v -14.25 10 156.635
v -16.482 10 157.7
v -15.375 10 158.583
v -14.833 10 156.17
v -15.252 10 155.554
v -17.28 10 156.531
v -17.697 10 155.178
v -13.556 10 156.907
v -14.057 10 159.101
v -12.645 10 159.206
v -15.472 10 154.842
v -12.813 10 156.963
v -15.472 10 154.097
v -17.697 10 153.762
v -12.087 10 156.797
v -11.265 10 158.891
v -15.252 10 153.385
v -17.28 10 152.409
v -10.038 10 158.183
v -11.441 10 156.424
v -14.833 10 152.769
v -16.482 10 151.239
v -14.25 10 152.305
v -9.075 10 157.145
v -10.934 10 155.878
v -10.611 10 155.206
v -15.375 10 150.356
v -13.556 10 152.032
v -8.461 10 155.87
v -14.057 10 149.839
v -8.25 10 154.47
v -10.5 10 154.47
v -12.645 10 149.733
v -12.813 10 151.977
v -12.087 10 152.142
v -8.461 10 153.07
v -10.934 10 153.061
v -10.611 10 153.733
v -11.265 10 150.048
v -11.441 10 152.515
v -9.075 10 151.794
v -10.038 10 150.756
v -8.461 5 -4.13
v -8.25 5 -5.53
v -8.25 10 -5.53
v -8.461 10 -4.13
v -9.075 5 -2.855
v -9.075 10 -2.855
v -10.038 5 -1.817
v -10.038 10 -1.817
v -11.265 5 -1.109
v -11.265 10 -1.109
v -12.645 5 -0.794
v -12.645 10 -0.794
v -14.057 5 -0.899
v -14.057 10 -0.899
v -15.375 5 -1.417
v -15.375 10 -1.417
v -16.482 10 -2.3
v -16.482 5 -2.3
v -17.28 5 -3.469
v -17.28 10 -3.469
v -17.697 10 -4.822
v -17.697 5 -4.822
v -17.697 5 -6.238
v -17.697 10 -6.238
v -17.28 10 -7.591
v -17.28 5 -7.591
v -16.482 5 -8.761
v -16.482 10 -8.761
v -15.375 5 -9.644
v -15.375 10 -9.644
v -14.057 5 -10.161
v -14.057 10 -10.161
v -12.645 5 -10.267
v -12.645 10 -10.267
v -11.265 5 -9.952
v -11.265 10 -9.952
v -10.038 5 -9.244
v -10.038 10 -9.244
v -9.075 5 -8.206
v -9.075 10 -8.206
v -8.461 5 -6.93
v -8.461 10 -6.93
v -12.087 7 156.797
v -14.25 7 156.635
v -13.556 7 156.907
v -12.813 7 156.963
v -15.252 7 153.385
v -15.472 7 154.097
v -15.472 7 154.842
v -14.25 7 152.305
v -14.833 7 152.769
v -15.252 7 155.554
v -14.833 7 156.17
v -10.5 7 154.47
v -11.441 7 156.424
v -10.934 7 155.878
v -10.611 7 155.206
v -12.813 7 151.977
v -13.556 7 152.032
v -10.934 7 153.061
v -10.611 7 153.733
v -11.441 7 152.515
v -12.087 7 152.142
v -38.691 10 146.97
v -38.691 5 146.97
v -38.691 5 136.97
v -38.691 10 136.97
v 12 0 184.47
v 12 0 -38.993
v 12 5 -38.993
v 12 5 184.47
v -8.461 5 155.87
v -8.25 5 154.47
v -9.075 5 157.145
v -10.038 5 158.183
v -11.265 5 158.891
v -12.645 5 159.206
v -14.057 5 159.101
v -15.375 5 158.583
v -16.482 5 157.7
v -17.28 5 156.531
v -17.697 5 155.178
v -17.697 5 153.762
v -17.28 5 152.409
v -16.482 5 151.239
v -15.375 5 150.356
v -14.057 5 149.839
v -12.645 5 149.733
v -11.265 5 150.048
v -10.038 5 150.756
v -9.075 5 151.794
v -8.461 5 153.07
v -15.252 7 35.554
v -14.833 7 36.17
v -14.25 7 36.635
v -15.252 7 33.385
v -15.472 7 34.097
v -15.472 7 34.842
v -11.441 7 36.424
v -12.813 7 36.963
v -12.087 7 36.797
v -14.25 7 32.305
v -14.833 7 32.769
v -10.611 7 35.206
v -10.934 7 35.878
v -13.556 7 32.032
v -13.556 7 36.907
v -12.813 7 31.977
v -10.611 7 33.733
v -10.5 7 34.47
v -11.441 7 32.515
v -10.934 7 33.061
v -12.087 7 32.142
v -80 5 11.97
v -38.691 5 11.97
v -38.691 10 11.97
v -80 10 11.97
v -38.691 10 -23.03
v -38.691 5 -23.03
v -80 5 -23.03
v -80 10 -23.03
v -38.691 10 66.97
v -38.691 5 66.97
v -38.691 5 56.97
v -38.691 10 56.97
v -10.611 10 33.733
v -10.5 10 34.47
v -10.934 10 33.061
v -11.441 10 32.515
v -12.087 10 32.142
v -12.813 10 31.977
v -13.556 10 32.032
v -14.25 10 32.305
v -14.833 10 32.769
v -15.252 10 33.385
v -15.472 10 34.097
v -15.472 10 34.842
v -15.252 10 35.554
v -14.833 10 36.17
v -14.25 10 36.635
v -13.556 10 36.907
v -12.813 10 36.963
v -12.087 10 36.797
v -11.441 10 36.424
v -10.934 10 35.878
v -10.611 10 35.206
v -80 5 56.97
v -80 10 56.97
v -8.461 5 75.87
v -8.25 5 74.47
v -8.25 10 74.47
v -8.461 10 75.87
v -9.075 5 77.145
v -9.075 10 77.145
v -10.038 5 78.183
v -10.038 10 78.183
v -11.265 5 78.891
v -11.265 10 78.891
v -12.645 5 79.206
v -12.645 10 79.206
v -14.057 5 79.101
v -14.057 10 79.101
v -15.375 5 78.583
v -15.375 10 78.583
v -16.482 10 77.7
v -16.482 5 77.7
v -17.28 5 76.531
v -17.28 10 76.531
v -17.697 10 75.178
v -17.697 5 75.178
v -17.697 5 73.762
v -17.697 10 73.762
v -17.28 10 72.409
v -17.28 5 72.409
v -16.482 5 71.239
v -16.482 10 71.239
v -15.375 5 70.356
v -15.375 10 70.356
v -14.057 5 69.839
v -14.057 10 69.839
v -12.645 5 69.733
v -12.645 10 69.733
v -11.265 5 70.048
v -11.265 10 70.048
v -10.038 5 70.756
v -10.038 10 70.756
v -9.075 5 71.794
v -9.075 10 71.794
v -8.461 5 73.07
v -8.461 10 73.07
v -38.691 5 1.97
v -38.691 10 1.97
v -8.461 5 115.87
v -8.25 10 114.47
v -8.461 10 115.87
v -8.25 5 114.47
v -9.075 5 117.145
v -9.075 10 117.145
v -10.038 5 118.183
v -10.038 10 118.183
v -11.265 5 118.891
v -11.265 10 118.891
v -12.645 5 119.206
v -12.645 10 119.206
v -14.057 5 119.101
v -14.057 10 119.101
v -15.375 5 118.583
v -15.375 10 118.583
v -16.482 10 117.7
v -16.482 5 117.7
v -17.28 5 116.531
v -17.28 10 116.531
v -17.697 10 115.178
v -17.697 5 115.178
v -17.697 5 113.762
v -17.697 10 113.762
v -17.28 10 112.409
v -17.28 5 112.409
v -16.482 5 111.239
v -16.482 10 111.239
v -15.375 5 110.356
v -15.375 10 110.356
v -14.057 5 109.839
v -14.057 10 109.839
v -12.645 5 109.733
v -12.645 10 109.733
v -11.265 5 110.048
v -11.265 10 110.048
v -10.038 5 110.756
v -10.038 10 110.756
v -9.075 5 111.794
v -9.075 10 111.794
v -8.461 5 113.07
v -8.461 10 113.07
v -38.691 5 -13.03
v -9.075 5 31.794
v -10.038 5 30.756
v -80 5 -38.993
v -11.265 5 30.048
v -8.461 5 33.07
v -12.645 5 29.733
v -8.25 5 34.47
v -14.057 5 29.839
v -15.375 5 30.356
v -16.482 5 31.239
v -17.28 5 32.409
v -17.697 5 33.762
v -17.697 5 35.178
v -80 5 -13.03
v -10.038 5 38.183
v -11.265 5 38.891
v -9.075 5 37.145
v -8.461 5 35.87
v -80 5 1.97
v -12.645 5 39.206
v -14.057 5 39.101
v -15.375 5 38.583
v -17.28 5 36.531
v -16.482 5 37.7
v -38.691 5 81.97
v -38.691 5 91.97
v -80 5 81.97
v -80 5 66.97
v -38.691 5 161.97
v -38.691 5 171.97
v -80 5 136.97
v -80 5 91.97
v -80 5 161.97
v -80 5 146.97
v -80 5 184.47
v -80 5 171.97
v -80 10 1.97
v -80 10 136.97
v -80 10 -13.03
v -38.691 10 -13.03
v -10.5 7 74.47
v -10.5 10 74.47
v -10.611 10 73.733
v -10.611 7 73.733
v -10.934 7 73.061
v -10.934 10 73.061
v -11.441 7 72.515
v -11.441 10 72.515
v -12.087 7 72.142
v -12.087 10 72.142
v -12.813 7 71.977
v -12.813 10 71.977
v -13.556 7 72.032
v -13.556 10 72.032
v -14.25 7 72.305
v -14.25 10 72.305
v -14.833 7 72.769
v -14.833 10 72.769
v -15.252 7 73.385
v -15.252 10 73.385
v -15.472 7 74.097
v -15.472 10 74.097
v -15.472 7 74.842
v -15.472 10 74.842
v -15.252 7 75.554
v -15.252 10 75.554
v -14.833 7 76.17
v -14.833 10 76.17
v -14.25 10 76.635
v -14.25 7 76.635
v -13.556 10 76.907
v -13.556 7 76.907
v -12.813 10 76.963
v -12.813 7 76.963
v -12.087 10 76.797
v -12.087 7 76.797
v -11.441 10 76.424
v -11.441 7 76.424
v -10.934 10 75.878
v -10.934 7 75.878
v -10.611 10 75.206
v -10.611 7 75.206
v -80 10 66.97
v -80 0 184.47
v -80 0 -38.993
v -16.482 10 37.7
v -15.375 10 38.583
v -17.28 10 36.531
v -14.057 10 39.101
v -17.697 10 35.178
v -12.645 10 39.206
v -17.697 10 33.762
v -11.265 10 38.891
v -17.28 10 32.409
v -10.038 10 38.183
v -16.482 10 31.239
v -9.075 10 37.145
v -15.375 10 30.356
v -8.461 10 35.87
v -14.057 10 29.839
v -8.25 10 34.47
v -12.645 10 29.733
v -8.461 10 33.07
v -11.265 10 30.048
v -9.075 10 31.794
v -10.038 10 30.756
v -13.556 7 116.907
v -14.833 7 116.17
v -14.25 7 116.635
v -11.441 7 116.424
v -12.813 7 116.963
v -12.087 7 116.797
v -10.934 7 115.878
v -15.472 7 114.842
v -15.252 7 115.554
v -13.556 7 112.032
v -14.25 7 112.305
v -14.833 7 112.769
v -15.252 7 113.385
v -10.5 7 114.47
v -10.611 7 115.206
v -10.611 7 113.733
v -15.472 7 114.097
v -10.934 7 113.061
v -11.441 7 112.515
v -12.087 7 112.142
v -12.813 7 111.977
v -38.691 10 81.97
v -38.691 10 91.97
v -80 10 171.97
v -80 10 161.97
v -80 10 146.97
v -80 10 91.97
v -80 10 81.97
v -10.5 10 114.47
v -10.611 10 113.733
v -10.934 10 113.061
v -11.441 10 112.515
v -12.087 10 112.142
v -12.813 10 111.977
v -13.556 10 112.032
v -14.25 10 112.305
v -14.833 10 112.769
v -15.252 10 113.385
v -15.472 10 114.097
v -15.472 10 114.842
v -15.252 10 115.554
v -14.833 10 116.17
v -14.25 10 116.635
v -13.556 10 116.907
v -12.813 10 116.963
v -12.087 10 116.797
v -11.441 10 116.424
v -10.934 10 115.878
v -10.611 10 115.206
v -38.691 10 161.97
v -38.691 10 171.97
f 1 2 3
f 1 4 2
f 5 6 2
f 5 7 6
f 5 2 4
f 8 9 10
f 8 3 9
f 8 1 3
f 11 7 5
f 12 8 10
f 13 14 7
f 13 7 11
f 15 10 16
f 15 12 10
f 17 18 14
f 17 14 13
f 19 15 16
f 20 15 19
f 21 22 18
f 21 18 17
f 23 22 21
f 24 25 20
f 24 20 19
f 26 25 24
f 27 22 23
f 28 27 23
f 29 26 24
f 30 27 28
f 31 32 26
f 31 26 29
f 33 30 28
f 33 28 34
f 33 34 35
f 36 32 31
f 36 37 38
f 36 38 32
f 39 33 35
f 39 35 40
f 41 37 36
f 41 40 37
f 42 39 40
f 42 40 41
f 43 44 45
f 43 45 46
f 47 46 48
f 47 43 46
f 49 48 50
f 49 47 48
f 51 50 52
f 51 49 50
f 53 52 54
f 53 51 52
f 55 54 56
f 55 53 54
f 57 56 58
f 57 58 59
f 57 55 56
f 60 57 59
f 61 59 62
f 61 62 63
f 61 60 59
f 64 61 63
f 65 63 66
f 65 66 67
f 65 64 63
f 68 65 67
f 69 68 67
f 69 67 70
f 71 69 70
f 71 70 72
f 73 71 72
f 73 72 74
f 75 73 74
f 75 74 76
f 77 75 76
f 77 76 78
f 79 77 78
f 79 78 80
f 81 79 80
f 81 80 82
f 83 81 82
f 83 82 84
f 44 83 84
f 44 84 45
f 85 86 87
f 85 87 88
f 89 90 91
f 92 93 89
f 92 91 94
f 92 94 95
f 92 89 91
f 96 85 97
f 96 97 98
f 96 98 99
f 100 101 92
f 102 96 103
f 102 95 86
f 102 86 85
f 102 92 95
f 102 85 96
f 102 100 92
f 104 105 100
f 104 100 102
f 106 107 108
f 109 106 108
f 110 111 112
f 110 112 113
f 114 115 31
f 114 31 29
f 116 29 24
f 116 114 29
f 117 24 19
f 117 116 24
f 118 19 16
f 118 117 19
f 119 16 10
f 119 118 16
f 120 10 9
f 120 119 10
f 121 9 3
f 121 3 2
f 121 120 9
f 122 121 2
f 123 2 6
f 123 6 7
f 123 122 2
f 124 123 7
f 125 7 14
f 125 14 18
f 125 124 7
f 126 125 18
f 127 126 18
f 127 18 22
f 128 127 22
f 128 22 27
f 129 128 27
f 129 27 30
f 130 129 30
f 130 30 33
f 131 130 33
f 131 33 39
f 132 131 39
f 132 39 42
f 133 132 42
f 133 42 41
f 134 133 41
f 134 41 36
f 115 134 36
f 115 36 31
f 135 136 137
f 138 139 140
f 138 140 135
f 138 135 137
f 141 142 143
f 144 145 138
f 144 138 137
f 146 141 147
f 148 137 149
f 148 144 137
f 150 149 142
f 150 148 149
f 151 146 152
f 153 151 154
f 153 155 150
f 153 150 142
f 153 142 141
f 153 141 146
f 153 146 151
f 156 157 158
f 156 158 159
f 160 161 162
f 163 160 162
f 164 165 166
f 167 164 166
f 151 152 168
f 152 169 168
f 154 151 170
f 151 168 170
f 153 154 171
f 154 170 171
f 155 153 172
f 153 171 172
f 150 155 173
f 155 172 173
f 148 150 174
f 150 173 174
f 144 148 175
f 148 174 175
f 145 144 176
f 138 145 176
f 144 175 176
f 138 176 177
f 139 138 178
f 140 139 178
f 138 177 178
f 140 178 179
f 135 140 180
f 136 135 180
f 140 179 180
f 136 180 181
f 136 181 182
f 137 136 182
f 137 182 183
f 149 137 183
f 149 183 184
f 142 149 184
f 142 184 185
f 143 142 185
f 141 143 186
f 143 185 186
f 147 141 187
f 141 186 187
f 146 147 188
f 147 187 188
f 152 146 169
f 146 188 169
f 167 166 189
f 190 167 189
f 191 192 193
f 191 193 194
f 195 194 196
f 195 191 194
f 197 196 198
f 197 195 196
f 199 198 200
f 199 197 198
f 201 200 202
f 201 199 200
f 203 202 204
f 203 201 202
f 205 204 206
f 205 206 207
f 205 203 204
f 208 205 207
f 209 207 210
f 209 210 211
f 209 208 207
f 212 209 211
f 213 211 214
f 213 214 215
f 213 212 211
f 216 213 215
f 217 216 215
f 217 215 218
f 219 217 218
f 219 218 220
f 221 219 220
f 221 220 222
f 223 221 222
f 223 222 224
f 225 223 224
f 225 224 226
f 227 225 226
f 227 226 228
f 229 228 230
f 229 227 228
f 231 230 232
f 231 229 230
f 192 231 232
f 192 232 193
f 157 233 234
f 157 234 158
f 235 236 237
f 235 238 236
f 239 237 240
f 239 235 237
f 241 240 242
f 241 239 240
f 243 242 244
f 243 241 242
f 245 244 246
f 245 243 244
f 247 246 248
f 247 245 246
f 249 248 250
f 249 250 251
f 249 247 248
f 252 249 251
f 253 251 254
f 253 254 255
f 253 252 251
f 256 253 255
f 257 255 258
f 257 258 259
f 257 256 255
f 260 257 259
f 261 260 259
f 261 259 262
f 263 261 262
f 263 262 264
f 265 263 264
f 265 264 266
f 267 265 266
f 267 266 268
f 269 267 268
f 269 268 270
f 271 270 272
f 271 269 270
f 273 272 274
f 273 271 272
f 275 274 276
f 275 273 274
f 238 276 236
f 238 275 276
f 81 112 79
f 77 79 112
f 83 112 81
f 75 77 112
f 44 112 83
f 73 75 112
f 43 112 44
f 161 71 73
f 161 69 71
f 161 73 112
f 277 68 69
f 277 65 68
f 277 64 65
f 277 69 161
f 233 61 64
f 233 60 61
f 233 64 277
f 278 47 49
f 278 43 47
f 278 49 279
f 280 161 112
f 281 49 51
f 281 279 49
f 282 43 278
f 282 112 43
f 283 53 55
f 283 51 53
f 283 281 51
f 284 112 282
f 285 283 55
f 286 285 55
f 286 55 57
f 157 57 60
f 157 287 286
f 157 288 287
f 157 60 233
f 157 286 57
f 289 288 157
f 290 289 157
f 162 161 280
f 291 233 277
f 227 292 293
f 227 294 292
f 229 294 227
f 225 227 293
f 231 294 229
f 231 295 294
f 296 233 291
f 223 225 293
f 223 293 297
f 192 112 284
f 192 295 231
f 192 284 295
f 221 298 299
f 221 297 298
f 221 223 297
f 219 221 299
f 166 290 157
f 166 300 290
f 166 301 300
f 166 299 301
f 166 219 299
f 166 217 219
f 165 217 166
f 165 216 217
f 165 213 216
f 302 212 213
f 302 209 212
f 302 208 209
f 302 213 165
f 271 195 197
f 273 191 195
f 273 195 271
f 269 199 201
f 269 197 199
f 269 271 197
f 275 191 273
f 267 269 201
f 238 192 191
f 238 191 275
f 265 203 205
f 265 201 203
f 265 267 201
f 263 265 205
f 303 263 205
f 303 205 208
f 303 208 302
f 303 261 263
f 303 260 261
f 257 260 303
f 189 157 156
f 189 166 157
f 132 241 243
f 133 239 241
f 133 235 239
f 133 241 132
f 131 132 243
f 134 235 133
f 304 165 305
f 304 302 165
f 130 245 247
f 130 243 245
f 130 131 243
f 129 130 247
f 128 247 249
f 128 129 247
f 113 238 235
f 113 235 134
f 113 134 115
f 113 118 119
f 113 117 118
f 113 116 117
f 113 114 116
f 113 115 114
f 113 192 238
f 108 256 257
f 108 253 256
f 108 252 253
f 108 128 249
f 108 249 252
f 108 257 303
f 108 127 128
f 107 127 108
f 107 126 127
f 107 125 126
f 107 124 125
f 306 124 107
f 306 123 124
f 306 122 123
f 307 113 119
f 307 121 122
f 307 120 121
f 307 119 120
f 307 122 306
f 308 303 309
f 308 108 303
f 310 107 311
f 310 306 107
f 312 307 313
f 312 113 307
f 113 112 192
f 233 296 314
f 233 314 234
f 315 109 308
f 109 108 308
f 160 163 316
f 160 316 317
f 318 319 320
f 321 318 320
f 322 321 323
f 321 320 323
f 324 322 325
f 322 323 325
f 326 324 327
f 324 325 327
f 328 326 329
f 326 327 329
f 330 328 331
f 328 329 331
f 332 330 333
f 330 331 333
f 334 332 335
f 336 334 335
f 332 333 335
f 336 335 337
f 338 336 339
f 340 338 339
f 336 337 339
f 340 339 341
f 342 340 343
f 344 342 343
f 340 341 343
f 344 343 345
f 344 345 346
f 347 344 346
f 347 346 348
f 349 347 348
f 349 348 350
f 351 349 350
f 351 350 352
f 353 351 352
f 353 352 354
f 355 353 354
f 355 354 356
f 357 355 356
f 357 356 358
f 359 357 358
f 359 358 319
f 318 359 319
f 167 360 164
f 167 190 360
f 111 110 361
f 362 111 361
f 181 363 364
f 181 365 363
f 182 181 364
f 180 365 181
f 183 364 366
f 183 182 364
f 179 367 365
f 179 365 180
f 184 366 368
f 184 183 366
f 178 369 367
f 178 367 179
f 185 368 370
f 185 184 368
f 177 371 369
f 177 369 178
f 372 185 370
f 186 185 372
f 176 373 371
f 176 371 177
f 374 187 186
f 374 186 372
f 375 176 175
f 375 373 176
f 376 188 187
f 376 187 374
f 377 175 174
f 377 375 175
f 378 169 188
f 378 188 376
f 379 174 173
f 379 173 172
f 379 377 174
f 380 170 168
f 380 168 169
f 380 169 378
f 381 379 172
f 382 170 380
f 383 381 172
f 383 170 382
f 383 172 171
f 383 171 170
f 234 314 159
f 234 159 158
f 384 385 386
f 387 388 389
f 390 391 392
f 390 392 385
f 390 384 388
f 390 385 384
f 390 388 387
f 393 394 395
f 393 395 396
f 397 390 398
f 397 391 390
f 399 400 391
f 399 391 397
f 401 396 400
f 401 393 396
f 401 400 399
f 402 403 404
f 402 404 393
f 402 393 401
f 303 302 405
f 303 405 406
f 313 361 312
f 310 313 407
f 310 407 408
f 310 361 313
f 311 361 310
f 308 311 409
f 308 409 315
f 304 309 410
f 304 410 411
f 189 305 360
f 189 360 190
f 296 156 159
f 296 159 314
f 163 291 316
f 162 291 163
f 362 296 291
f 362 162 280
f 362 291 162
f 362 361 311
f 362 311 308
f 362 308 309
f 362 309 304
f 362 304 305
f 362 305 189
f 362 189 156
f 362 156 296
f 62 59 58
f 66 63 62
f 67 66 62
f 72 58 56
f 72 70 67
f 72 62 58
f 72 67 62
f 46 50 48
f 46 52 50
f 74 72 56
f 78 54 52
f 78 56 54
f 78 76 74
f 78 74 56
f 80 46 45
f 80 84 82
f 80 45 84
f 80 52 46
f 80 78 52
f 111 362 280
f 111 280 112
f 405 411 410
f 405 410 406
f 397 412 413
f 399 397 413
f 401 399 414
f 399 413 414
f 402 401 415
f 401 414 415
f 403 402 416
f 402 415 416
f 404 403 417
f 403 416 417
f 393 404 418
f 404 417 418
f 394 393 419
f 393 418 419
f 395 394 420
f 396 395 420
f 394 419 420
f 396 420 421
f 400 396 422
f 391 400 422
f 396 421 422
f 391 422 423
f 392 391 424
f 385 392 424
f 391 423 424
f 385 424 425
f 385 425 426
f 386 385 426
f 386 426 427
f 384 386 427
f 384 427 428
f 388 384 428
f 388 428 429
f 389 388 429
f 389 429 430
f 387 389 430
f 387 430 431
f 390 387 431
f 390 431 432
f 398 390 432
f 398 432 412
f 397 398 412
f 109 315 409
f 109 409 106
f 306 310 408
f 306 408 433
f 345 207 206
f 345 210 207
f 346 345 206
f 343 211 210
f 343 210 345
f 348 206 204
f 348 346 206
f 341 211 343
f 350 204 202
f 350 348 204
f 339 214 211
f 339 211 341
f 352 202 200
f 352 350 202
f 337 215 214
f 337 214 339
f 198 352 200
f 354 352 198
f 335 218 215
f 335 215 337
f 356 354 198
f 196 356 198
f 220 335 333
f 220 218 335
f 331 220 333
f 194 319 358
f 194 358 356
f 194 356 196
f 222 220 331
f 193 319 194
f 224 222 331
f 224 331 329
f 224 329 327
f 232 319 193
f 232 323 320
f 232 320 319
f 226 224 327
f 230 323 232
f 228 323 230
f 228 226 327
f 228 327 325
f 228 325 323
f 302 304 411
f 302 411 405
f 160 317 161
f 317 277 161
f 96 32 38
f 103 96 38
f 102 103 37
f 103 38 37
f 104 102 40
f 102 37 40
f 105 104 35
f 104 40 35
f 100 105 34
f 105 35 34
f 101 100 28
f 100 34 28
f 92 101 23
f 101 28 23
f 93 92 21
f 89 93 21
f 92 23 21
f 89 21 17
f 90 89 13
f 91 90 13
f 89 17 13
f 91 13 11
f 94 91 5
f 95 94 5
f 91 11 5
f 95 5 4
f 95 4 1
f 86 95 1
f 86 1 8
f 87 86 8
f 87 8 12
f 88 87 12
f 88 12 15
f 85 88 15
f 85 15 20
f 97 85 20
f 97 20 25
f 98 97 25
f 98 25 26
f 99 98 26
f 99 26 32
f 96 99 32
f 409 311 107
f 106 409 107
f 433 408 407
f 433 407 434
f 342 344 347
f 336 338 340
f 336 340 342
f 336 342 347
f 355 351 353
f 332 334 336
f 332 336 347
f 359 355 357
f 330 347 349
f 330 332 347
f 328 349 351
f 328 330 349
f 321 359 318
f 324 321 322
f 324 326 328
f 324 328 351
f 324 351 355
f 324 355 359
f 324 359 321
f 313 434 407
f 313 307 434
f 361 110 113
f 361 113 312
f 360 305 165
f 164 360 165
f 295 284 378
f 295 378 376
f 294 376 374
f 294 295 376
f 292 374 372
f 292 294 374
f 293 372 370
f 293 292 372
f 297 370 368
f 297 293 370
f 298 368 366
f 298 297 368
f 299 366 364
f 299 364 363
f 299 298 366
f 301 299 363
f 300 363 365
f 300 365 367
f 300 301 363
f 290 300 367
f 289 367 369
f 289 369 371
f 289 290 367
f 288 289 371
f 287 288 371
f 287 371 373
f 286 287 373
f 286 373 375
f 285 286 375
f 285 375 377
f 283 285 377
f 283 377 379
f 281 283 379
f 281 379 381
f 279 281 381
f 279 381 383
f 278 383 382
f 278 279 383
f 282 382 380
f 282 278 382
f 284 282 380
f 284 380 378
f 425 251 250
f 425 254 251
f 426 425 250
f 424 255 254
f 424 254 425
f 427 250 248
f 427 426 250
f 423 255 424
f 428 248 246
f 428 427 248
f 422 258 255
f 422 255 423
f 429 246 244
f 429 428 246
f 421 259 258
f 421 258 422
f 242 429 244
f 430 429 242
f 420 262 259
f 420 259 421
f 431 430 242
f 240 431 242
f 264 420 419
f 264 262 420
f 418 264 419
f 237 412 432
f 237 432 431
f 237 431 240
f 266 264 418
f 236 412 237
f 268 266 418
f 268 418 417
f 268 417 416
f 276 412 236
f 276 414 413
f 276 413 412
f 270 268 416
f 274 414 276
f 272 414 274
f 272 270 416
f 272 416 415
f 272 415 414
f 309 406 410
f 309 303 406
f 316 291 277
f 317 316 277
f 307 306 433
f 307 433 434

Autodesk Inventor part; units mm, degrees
ref_plane "YZ Plane" through (0, 0, 0) normal (1, 0, 0) x (0, 1, 0)
ref_plane "XZ Plane" through (0, 0, 0) normal (0, 1, 0) x (-1, 0, 0)
ref_plane "XY Plane" through (0, 0, 0) normal (0, 0, 1) x (1, 0, 0)
sketch "Sketch1" plane through (0, 0, 0) normal (0, 1, 0) x (-1, 0, 0)
  line L0 (-12, 184.4696) -> (80, 184.4696)
  line L1 (80, 184.4696) -> (80, -38.9934)
  line L2 (80, -38.9934) -> (-12, -38.9934)
  line L3 (-12, -38.9934) -> (-12, 184.4696)
  point P0 (0, 0)
  dimension "d0" = 92
  dimension "d1" = 223.463
extrude "Extrusion1" add sketch "Sketch1" along normal blind 5
sketch "Sketch2" plane through (0, 5, 0) normal (0, 1, 0) x (1, 0, 0)
  line L0 (-80, -184.4696) -> (12, -184.4696) projected
  line L1 (12, -184.4696) -> (-13, -184.4696)
  line L2 (-13, -184.4696) -> (-13, -154.4696)
  circle A0 centre (-13, -154.4696) radius 4.75
  line L3 (-13, -154.4696) -> (-13, -114.4696)
  line L4 (-13, -114.4696) -> (-13, -74.4696)
  line L5 (-13, -74.4696) -> (-13, -34.4696)
  circle A1 centre (-13, -114.4696) radius 4.75
  circle A2 centre (-13, -74.4696) radius 4.75
  circle A3 centre (-13, -34.4696) radius 4.75
  line L6 (-13, -34.4696) -> (-13, 5.5304)
  circle A4 centre (-13, 5.5304) radius 4.75
  point P0 (0, 0)
  dimension "d4" = 25
  dimension "d5" = 30
  dimension "d6" = 9.5
  dimension "d7" = 40
  dimension "d8" = 40
  dimension "d9" = 40
  dimension "d10" = 9.5
  dimension "d11" = 9.5
  dimension "d12" = 9.5
  dimension "d34" = 40
  dimension "d35" = 9.5
extrude "Extrusion2" add sketch "Sketch2" along normal blind 5
sketch "Sketch3" plane through (-13, 10, 154.4696) normal (0, 1, 0) x (1, 0, 0)
  circle A0 centre (0, 0) radius 2.5
  circle A1 centre (0, 0) radius 4.75 projected
  line L0 (0, 0) -> (0, 193.463)
  line L1 (25, 193.463) -> (-67, 193.463) projected
  circle A2 centre (0, 40) radius 2.5
  circle A3 centre (0, 80) radius 2.5
  circle A4 centre (0, 120) radius 2.5
  point P0 (13, 154.4696)
  dimension "d15" = 5
  dimension "d18" = 40
extrude "Extrusion3" cut sketch "Sketch3" against normal blind 3 contours A0 | A4 L0 | L0 A4 | A3 L0 | L0 A3 | A2 L0 | L0 A2
sketch "Sketch4" plane through (0, 5, 0) normal (0, 1, 0) x (1, 0, 0)
  circle A0 centre (-13, -154.4696) radius 2.5 projected
  line L0 (-13, -154.4696) -> (-80, -154.4696)
  line L1 (-80, 38.9934) -> (-80, -184.4696) projected
  line L2 (-40, -161.9696) -> (-80, -161.9696)
  line L3 (-80, -161.9696) -> (-80, -146.9696)
  line L4 (-80, -146.9696) -> (-40, -146.9696)
  line L5 (-40, -146.9696) -> (-40, -161.9696)
  line L6 (-40, -161.9696) -> (-80, -146.9696) construction
  line L7 (-80, -161.9696) -> (-40, -146.9696) construction
  line L8 (-80, -161.9696) -> (-38.6907, -161.9696)
  line L9 (-38.6907, -161.9696) -> (-38.6907, -171.9696)
  line L10 (-38.6907, -171.9696) -> (-80, -171.9696)
  line L11 (-80, -171.9696) -> (-80, -161.9696)
  line L12 (-80, -146.9696) -> (-38.6907, -146.9696)
  line L13 (-38.6907, -146.9696) -> (-38.6907, -136.9696)
  line L14 (-38.6907, -136.9696) -> (-80, -136.9696)
  line L15 (-80, -136.9696) -> (-80, -146.9696)
  point P0 (0, 0)
  point P1 (-60, -154.4696)
  point P2 (-40.5122, -103.5066)
  point P3 (-80, -136.9696)
  point P4 (-40.5122, -118.5066)
  point P5 (-80, -171.9696)
  point P6 (-40, -146.9696)
  point P7 (-40, -146.9696)
  point P8 (-40, -161.9696)
  dimension "d25" = 15
  dimension "d26" = 40
  dimension "d27" = 10
  dimension "d28" = 10
extrude "Extrusion4" add sketch "Sketch4" along normal blind 5 contours L4 L1 L14 L13 L12 | L8 L9 L10 L1 L2
pattern_linear "Rectangular Pattern1" count 3 spacing 80 along (0, 0, -1) of "Extrusion4"
properties part number "Podstawka"
